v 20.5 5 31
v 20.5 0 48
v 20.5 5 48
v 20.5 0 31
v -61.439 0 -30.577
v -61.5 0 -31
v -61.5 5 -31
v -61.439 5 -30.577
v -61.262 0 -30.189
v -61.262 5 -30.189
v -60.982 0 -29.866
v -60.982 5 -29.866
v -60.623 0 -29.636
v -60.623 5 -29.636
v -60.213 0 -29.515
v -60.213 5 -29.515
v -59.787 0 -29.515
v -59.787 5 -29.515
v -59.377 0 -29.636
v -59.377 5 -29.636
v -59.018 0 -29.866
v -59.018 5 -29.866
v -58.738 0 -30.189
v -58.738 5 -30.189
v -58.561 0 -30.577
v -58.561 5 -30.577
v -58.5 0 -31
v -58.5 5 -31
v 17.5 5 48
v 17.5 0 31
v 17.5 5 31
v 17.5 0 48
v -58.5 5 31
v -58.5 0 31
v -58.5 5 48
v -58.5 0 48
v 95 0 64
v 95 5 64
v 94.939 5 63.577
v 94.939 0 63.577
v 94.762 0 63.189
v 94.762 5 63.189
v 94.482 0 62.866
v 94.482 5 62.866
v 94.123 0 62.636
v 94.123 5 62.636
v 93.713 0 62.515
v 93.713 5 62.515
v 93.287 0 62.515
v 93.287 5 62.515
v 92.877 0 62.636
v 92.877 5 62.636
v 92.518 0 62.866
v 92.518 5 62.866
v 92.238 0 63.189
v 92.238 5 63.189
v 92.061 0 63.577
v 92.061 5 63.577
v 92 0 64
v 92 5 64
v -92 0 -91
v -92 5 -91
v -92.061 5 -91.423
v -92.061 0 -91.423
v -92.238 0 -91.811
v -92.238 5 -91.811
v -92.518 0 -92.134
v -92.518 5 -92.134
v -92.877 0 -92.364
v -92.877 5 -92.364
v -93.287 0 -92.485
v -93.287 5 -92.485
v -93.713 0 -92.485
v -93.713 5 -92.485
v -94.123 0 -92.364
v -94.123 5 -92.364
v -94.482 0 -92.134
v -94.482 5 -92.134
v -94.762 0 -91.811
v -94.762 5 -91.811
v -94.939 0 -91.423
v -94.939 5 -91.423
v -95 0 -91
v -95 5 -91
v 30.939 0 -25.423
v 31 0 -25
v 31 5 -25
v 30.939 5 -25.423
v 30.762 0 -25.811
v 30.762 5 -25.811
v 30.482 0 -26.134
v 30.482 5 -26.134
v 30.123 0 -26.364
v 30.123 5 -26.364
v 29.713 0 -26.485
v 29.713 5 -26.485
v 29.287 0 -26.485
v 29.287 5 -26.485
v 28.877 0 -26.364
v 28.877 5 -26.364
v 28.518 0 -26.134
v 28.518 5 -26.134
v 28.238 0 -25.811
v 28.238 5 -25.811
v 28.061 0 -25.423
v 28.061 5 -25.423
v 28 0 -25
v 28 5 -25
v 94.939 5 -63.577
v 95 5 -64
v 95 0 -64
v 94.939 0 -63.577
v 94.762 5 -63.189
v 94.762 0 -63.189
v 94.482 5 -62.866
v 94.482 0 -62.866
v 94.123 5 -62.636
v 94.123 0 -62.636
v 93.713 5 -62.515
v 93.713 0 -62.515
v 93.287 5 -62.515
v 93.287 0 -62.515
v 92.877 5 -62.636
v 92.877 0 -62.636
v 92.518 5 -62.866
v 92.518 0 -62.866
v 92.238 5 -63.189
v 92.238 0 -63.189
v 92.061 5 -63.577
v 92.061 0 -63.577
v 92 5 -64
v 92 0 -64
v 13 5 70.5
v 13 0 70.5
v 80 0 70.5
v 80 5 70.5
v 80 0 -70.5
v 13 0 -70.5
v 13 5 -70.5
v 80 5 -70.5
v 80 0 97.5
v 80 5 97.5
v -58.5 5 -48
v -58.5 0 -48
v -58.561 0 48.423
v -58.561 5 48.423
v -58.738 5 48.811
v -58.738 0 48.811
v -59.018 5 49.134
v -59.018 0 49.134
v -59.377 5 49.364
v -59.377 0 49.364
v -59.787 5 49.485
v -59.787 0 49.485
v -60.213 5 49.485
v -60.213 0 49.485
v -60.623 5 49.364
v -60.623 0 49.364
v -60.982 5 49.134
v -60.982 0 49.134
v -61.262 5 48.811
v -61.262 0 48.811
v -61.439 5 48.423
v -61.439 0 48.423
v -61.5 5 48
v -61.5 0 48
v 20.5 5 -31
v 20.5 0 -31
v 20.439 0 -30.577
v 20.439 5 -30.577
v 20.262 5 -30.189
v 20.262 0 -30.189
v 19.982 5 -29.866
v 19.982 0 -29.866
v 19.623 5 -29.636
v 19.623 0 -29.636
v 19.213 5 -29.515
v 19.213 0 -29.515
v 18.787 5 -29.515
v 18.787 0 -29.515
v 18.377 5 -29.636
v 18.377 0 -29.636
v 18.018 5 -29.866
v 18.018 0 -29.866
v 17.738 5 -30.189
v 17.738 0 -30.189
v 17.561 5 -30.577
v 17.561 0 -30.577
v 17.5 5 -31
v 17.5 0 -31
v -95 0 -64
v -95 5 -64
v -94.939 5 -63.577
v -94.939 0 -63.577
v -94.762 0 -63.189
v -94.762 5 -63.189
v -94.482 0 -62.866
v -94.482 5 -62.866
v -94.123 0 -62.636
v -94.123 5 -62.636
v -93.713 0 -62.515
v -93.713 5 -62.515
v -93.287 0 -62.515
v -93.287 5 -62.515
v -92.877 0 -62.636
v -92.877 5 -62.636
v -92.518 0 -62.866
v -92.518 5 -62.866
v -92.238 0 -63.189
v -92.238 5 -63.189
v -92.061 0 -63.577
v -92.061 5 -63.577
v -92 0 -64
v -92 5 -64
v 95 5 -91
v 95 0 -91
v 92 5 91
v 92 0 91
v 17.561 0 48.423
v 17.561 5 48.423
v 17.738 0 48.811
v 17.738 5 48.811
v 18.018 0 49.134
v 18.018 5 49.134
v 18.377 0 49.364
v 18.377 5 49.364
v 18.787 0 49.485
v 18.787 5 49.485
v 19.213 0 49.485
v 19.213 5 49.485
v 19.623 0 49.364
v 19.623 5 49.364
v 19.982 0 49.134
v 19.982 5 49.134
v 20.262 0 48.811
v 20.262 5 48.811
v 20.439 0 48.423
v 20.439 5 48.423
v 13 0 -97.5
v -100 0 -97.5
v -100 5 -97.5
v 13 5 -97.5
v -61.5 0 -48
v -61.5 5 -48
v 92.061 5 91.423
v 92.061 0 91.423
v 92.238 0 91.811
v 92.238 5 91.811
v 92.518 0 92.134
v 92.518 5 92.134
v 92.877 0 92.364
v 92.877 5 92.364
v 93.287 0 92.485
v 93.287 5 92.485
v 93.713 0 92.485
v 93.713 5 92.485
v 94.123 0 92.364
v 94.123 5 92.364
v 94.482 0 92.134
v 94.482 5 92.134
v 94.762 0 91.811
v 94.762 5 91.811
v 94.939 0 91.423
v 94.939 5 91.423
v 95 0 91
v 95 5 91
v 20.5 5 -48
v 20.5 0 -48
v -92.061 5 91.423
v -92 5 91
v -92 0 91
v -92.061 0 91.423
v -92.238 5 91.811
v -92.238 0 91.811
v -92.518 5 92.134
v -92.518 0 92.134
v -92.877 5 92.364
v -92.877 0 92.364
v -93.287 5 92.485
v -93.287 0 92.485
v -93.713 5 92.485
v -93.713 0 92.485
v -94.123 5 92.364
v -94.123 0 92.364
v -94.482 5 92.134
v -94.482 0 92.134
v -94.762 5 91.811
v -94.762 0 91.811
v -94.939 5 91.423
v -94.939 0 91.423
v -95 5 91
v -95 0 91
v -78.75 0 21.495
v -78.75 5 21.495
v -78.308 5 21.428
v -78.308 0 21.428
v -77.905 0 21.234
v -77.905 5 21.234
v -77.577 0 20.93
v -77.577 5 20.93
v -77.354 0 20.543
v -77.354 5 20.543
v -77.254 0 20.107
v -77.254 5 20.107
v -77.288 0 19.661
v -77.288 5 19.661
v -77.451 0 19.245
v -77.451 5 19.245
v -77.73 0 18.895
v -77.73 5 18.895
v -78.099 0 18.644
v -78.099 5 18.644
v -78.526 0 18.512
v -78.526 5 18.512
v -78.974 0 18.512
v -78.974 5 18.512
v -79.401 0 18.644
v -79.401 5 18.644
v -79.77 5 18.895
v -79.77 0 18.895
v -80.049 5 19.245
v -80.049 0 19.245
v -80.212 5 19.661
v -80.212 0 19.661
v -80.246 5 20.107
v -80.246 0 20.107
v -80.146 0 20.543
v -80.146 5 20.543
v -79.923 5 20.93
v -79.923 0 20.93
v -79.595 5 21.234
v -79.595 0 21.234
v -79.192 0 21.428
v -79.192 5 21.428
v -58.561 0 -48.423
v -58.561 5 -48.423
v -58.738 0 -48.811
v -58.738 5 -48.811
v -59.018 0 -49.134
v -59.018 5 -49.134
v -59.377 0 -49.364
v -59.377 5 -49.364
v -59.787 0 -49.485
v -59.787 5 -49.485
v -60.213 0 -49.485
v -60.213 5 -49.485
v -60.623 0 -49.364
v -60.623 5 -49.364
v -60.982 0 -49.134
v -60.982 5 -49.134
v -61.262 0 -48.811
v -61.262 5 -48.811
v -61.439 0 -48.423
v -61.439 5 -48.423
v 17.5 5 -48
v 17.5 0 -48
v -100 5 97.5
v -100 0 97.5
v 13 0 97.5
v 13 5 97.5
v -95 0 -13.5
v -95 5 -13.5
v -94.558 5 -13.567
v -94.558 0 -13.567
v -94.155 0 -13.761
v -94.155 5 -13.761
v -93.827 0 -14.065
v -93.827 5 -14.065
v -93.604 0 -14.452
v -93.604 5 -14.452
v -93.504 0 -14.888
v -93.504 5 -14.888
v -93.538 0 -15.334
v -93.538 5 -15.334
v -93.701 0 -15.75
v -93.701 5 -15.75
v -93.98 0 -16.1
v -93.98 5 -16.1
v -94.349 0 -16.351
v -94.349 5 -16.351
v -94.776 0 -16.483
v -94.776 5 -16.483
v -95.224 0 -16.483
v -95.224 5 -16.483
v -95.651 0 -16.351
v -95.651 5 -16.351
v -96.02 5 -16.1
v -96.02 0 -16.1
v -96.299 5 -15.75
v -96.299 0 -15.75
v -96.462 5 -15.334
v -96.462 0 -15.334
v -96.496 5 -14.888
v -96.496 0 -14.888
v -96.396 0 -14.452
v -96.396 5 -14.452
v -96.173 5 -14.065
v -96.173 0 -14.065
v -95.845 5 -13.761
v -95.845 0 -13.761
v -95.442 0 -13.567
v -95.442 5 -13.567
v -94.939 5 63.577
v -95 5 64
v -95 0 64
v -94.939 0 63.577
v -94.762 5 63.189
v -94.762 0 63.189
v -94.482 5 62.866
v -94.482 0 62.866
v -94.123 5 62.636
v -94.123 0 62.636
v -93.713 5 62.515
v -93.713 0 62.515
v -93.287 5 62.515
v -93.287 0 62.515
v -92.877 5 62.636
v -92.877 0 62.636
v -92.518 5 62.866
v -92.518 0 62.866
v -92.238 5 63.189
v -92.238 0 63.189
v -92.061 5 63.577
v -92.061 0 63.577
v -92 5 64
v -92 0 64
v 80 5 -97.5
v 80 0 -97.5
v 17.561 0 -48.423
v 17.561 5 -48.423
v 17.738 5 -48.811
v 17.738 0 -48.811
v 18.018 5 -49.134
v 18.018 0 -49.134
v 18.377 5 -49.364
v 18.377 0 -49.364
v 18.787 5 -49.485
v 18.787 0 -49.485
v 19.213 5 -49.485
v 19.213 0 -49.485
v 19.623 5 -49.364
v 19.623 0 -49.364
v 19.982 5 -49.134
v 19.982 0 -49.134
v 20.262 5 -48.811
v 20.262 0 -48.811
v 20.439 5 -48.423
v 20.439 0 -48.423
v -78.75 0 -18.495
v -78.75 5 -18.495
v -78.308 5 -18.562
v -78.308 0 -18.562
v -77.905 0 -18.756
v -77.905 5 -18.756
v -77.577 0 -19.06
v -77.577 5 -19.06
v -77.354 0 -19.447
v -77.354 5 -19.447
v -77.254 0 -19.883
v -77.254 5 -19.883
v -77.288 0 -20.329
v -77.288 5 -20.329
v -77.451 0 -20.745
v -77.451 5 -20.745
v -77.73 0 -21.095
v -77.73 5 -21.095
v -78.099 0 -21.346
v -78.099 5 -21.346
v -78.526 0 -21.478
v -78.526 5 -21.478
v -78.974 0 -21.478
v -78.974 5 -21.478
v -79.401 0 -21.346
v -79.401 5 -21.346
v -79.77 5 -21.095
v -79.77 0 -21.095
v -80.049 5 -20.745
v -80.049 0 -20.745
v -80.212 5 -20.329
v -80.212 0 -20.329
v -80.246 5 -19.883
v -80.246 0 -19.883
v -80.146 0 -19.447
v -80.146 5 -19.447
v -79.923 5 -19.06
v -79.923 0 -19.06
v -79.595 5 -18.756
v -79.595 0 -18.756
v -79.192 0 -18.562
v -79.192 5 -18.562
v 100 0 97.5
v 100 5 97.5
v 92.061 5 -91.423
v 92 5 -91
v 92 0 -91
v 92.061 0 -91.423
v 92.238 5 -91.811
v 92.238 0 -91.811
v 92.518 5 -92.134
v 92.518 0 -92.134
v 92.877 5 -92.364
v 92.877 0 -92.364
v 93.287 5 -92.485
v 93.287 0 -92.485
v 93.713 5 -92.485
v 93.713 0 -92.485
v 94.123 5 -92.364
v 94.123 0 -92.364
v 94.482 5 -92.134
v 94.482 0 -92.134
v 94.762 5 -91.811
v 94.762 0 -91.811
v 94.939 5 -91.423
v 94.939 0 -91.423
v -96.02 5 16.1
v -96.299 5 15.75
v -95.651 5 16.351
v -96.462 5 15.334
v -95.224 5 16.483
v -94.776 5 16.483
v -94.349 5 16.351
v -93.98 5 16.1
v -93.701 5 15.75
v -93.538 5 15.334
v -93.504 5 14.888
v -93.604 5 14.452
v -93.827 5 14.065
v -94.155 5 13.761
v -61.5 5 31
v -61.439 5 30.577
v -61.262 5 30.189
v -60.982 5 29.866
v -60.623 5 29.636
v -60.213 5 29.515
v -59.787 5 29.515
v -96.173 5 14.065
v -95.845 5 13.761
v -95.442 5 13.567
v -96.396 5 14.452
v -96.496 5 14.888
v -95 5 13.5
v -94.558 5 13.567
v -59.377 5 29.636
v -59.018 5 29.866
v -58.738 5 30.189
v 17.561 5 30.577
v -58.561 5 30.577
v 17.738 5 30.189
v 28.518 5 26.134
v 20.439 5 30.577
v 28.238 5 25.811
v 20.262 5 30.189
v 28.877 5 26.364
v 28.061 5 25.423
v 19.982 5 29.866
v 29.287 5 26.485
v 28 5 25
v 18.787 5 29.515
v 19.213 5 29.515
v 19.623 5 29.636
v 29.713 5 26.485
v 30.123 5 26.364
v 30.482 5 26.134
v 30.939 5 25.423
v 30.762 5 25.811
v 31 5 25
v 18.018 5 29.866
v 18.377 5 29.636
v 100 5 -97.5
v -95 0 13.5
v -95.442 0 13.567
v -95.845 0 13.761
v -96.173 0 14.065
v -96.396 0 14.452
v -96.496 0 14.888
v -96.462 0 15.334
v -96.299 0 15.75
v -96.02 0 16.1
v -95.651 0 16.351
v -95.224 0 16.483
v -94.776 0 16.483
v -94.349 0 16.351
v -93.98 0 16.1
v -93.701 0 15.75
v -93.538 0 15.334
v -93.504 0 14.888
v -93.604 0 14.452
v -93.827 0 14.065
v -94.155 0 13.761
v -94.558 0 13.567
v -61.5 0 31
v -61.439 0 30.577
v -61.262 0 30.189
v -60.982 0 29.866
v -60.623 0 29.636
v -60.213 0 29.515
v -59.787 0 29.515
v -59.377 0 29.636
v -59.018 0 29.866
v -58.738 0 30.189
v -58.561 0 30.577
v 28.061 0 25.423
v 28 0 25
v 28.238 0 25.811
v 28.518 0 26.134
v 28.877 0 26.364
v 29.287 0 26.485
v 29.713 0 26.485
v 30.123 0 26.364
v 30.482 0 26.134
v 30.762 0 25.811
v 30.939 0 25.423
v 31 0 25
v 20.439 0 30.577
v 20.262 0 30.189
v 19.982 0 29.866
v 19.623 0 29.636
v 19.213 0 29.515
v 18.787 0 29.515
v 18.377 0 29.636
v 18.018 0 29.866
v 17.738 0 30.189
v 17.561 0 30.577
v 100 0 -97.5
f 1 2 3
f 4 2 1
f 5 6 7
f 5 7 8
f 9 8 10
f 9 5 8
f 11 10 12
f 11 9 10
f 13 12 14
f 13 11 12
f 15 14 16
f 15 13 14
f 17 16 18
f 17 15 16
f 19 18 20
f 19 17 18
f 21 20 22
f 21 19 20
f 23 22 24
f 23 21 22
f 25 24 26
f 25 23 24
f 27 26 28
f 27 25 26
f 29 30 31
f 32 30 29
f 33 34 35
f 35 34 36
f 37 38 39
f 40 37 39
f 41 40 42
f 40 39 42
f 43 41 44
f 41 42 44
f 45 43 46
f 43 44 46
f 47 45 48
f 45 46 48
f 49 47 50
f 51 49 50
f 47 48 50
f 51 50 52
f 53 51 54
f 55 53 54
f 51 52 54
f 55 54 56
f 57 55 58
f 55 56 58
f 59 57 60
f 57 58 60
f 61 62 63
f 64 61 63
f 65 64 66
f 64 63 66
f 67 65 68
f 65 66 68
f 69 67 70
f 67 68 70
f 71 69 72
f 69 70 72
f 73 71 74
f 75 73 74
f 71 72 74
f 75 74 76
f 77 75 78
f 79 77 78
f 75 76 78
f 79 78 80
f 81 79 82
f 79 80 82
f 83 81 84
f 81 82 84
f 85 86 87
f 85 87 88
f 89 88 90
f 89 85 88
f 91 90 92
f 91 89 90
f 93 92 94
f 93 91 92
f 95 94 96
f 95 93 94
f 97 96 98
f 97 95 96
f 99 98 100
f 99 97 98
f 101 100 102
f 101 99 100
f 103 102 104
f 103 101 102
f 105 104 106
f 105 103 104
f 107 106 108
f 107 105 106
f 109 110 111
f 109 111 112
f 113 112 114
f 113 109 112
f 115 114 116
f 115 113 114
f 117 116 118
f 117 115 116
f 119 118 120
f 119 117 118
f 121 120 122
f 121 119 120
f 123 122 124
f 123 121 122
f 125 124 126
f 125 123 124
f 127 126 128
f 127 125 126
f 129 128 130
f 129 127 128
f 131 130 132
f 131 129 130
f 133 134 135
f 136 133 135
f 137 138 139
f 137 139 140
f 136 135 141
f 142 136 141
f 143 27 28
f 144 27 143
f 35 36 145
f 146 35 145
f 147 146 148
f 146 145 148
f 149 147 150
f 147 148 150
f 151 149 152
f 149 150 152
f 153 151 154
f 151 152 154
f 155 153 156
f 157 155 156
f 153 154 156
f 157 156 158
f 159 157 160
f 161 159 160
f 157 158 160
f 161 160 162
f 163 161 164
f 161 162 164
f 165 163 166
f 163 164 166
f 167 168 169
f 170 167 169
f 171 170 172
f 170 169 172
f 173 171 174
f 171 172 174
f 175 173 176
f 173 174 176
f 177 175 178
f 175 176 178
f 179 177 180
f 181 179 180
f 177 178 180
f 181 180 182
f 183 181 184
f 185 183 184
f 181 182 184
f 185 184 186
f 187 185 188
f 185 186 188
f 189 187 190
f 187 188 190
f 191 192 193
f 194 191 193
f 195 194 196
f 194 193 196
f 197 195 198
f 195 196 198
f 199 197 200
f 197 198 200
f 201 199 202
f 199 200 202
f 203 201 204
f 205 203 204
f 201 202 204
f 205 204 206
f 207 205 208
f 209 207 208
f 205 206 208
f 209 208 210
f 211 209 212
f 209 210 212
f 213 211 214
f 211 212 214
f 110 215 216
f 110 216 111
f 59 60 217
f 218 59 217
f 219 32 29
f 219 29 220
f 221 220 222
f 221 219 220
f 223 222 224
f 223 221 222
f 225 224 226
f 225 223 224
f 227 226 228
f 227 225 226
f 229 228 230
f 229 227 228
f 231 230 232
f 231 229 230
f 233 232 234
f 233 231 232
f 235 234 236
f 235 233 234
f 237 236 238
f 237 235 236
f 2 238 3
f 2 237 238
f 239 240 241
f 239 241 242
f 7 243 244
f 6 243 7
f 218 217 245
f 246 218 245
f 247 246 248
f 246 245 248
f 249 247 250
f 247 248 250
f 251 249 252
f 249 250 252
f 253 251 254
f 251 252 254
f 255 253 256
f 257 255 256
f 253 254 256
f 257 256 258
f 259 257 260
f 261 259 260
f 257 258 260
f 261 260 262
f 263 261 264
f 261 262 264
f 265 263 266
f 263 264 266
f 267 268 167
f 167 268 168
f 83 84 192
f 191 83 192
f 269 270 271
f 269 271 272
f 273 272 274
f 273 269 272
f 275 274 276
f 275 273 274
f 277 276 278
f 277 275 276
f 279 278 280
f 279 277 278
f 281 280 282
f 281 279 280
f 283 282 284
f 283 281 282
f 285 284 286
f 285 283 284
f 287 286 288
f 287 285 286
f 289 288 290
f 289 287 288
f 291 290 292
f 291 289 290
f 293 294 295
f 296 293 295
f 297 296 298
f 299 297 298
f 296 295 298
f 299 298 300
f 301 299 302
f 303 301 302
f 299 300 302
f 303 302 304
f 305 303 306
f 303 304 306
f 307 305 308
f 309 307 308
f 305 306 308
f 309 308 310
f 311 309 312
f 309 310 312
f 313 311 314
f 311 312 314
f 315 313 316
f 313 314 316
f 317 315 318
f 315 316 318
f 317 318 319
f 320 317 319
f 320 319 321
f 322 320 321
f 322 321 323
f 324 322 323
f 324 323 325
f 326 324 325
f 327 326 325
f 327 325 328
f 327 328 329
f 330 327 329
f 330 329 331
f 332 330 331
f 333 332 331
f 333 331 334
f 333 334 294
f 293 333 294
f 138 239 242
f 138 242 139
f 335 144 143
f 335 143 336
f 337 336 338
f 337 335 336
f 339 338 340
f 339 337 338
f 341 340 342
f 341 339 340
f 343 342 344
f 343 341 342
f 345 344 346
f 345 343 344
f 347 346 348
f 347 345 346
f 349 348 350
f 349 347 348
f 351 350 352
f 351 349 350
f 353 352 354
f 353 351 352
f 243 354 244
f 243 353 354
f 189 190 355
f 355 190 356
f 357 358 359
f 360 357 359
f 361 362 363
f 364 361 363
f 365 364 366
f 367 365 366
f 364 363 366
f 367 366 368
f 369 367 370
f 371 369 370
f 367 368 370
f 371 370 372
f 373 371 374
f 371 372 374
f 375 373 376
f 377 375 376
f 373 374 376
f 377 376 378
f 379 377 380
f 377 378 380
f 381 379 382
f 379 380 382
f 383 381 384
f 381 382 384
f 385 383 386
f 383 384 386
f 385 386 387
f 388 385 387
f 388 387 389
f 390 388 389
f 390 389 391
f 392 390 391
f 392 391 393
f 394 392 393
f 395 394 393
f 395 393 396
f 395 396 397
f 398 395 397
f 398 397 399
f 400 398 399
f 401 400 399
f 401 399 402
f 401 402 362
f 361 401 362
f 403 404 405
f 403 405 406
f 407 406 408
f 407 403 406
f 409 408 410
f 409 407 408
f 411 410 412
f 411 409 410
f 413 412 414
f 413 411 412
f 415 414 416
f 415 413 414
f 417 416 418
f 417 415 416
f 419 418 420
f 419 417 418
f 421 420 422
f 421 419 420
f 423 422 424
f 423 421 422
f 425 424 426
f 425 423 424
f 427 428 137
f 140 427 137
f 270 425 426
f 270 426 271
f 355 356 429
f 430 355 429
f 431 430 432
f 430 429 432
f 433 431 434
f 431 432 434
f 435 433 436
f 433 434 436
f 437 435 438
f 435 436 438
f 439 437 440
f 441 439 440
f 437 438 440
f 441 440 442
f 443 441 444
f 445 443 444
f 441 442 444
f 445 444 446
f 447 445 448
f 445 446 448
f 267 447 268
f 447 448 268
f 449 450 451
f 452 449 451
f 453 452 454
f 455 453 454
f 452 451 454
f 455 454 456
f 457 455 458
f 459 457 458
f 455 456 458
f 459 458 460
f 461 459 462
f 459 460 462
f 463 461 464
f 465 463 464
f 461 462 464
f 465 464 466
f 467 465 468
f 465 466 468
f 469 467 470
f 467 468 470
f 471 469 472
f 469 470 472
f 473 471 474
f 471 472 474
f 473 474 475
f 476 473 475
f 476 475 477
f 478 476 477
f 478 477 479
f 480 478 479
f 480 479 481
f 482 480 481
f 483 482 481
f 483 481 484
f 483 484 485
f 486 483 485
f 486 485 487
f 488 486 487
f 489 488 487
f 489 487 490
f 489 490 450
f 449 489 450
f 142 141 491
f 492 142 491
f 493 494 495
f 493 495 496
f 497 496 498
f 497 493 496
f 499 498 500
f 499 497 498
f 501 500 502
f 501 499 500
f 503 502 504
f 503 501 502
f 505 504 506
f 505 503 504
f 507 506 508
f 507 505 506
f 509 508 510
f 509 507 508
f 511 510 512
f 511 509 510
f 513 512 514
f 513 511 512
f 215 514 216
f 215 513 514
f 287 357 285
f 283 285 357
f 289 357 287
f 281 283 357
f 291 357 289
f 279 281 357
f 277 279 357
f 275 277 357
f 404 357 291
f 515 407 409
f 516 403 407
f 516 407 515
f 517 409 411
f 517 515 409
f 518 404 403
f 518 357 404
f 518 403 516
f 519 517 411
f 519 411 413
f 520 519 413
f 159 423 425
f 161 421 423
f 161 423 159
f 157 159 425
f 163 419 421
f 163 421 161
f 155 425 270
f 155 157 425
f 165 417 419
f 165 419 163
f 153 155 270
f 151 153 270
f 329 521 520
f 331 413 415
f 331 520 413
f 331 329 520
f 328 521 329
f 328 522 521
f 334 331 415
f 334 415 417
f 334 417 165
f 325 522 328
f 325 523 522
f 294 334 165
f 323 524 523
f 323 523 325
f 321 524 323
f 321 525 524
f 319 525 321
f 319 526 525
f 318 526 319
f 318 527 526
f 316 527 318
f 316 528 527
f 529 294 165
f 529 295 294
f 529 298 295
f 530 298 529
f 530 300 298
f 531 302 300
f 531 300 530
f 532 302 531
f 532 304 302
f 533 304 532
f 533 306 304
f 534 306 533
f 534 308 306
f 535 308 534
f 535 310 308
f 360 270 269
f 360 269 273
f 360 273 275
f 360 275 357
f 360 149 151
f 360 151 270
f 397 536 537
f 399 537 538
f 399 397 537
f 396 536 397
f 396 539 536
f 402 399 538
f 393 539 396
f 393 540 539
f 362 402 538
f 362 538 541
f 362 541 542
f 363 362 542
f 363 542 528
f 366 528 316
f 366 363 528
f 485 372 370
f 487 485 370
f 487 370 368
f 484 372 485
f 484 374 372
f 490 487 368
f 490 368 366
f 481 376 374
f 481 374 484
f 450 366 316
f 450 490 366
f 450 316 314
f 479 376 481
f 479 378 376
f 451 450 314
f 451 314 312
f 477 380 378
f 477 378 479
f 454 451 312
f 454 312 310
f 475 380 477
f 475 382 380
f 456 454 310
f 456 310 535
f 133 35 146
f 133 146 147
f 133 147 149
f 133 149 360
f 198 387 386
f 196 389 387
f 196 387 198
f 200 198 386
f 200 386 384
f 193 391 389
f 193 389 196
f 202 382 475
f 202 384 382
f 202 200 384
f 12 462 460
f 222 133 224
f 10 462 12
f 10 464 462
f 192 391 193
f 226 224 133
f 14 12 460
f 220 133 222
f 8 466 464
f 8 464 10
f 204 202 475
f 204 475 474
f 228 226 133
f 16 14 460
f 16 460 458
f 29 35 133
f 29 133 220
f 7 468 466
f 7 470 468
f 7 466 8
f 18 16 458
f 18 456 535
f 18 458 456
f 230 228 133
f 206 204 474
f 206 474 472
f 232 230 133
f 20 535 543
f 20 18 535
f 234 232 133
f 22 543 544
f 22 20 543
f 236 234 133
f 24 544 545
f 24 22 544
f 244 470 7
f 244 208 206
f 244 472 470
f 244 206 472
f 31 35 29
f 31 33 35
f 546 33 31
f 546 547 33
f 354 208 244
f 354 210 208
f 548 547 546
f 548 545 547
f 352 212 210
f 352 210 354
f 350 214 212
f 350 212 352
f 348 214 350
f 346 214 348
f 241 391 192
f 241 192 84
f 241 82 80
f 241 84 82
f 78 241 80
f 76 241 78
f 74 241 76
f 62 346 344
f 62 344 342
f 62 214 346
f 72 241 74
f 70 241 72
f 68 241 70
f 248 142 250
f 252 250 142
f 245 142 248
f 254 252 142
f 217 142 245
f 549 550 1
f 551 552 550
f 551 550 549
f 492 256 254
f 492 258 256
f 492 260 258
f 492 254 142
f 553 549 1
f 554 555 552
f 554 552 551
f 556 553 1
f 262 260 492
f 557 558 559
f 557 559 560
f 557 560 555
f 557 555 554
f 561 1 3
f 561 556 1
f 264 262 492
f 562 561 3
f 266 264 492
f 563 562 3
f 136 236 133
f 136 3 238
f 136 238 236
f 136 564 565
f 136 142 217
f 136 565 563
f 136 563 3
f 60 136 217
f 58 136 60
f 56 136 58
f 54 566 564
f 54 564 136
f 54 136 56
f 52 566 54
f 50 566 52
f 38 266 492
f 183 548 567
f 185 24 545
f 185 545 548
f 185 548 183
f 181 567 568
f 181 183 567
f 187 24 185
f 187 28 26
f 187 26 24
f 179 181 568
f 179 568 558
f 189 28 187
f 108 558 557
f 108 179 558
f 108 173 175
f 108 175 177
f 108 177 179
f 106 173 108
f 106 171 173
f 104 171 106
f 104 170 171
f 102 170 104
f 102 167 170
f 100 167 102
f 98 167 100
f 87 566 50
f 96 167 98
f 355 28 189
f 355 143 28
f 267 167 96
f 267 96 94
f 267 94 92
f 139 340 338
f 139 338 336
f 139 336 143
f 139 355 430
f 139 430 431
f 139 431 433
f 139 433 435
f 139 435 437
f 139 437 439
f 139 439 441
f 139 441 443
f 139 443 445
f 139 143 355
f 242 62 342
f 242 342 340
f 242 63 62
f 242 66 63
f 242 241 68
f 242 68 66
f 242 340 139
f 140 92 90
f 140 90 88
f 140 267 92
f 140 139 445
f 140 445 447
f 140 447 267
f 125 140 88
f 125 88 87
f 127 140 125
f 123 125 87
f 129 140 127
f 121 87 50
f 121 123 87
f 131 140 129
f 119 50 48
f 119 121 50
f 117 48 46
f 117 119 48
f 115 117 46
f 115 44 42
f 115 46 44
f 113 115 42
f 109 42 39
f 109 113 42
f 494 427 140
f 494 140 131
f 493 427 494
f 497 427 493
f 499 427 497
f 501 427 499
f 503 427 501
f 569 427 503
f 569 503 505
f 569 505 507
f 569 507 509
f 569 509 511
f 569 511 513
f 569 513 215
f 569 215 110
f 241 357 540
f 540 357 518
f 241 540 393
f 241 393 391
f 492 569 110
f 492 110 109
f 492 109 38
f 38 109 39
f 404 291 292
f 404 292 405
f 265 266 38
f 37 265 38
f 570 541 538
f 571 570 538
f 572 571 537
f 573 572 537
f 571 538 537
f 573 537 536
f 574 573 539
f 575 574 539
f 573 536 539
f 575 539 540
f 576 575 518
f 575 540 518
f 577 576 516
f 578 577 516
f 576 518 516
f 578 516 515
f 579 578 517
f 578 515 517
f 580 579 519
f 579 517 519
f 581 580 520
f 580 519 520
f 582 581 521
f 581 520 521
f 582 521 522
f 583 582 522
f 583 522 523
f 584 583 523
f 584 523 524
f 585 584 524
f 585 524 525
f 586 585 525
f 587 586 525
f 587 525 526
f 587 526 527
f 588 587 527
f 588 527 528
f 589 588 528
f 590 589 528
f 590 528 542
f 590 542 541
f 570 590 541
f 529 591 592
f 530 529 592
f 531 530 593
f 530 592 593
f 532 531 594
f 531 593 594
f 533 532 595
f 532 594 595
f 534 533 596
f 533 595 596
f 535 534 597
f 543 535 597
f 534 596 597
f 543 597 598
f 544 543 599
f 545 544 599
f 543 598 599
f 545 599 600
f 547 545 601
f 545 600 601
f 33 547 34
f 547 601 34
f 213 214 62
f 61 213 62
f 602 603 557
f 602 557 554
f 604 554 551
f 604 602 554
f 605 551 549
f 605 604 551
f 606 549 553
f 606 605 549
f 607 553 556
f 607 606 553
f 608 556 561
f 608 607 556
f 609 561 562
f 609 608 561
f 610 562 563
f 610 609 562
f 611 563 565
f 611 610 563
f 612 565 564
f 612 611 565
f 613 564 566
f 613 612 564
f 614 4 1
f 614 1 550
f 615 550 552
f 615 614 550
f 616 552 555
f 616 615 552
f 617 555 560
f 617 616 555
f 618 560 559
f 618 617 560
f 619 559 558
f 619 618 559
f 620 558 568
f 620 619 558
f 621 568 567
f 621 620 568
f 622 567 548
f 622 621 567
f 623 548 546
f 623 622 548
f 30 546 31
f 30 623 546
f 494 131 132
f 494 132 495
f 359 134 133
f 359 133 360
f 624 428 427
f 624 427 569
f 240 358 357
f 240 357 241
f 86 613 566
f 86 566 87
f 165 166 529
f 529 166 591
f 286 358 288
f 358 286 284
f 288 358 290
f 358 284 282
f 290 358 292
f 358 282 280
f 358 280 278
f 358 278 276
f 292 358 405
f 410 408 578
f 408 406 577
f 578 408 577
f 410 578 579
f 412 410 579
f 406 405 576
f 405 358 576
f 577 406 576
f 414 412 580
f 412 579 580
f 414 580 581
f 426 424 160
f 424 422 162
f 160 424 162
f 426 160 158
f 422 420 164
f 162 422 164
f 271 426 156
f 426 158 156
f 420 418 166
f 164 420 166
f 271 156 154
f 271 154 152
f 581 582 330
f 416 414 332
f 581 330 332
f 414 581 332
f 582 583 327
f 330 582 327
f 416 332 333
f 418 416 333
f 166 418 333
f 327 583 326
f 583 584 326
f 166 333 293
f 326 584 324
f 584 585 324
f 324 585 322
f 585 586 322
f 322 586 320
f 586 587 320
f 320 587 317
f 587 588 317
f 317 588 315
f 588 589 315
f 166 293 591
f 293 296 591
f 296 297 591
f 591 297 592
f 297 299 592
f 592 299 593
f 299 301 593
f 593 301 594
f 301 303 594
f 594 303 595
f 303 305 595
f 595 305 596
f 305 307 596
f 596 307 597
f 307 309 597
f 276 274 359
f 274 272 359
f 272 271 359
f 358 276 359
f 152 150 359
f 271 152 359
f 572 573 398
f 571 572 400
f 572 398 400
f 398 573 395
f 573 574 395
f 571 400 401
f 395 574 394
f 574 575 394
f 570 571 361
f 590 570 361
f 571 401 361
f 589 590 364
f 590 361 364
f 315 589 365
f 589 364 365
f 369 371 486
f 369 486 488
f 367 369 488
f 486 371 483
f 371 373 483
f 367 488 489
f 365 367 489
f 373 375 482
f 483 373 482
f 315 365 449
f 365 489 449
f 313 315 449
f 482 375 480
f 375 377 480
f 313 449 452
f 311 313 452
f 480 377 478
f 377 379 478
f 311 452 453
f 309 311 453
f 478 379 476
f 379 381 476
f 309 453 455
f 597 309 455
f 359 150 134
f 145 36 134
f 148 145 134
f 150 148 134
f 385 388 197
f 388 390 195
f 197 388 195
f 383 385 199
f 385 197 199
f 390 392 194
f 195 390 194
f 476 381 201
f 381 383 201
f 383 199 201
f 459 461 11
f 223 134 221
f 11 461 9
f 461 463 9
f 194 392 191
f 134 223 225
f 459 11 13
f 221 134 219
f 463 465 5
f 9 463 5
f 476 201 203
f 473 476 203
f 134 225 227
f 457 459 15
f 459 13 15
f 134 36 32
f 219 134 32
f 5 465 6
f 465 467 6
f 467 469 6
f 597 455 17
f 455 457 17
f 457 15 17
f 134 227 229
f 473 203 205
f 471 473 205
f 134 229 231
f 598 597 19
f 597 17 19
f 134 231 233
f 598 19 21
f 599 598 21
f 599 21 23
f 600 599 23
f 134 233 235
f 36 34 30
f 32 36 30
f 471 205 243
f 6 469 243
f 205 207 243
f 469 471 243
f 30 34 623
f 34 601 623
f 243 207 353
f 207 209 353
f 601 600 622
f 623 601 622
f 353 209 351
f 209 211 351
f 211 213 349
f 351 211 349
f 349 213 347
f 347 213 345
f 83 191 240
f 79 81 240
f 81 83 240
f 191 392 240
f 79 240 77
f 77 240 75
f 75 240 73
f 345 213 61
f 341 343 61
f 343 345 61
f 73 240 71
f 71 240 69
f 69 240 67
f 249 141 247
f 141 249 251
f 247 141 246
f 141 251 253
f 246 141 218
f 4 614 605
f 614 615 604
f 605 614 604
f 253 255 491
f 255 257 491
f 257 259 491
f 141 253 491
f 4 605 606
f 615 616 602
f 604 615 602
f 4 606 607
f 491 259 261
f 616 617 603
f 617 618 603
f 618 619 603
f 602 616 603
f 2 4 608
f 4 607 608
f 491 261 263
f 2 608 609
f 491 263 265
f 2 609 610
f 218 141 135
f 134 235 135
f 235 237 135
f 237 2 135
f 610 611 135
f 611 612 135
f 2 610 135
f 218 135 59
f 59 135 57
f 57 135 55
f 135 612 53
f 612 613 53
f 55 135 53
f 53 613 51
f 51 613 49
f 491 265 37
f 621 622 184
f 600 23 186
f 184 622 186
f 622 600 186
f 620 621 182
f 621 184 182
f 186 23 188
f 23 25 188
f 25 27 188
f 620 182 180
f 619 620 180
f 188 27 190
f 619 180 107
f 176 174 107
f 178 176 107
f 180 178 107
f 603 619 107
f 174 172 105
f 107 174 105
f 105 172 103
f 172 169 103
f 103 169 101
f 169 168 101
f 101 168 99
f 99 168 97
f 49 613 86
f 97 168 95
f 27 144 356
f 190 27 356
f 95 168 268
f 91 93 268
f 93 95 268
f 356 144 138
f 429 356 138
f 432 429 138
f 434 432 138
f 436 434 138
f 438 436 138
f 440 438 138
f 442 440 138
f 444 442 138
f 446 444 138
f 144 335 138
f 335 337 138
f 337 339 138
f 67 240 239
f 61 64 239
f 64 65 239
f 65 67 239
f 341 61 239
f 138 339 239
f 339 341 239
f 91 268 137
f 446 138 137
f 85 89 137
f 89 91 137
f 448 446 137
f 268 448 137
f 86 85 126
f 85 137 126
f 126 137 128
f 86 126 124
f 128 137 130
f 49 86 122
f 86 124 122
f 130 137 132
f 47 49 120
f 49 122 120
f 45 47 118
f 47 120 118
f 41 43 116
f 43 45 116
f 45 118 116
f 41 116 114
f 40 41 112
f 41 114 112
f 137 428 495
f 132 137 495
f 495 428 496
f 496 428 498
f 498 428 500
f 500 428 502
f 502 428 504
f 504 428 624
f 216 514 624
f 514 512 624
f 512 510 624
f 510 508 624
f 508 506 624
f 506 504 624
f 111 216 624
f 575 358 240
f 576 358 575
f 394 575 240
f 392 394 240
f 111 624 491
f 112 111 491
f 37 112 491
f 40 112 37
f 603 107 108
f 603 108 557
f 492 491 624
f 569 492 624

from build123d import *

# Parameters (mm, degrees)
SKETCH2_W           = 200
SKETCH2_H           = 195
BOSS_EXTRUDE1_DEPTH = 5
CUT_EXTRUDE1_DEPTH  = 140.754248594
SKETCH4_W           = 67
SKETCH4_H           = 27
CUT_EXTRUDE2_DEPTH  = 140.754248594
CUT_EXTRUDE4_DEPTH  = 140.754248594
CUT_EXTRUDE5_DEPTH  = 140.754248594
SKETCH8_R           = 1.5
CUT_EXTRUDE6_DEPTH  = 140.754248594
SKETCH9_R           = 1.5
CUT_EXTRUDE7_DEPTH  = 140.754248594


with BuildPart() as part:
    # Sketch2 → Boss-Extrude1 (new body)
    with BuildSketch(Plane(origin=(0, 0, 0), x_dir=(1, 0, 0), z_dir=(0, 1, 0))):
        Rectangle(SKETCH2_W, SKETCH2_H)
    extrude(amount=BOSS_EXTRUDE1_DEPTH)

    # Sketch3 → Cut-Extrude1 (cut, through all)
    with BuildSketch(Plane(origin=(0, 5, 0), x_dir=(1, 0, 0), z_dir=(0, 1, 0))):
        with BuildLine():
            Line((-95, -91), (-95, -64))
            ThreePointArc((-95, -64), (-93.5, -62.5), (-92, -64))
            Line((-92, -64), (-92, -91))
            ThreePointArc((-92, -91), (-93.5, -92.5), (-95, -91))
        make_face()
        with BuildLine():
            Line((-95, 91), (-95, 64))
            ThreePointArc((-95, 64), (-93.5, 62.5), (-92, 64))
            Line((-92, 64), (-92, 91))
            ThreePointArc((-92, 91), (-93.5, 92.5), (-95, 91))
        make_face()
        with BuildLine():
            Line((95, 91), (95, 64))
            ThreePointArc((95, 64), (93.5, 62.5), (92, 64))
            Line((92, 64), (92, 91))
            ThreePointArc((92, 91), (93.5, 92.5), (95, 91))
        make_face()
        with BuildLine():
            Line((95, -91), (95, -64))
            ThreePointArc((95, -64), (93.5, -62.5), (92, -64))
            Line((92, -64), (92, -91))
            ThreePointArc((92, -91), (93.5, -92.5), (95, -91))
        make_face()
    extrude(amount=-CUT_EXTRUDE1_DEPTH, mode=Mode.SUBTRACT)

    # Sketch4 → Cut-Extrude2 (cut, through all)
    with BuildSketch(Plane.XZ):
        with Locations((46.5, -84)):
            Rectangle(SKETCH4_W, SKETCH4_H)
        with Locations((46.5, 84)):
            Rectangle(SKETCH4_W, SKETCH4_H)
    extrude(amount=-CUT_EXTRUDE2_DEPTH, mode=Mode.SUBTRACT)

    # Sketch5 → Cut-Extrude4 (cut, through all)
    with BuildSketch(Plane.XZ):
        with BuildLine():
            Line((-61.5, -48), (-61.5, -31))
            ThreePointArc((-61.5, -31), (-60, -29.5), (-58.5, -31))
            Line((-58.5, -31), (-58.5, -48))
            ThreePointArc((-58.5, -48), (-60, -49.5), (-61.5, -48))
        make_face()
        with BuildLine():
            Line((-61.5, 48), (-61.5, 31))
            ThreePointArc((-61.5, 31), (-60, 29.5), (-58.5, 31))
            Line((-58.5, 31), (-58.5, 48))
            ThreePointArc((-58.5, 48), (-60, 49.5), (-61.5, 48))
        make_face()
        with BuildLine():
            Line((20.5, 48), (20.5, 31))
            ThreePointArc((20.5, 31), (19, 29.5), (17.5, 31))
            Line((17.5, 31), (17.5, 48))
            ThreePointArc((17.5, 48), (19, 49.5), (20.5, 48))
        make_face()
        with BuildLine():
            Line((20.5, -48), (20.5, -31))
            ThreePointArc((20.5, -31), (19, -29.5), (17.5, -31))
            Line((17.5, -31), (17.5, -48))
            ThreePointArc((17.5, -48), (19, -49.5), (20.5, -48))
        make_face()
    extrude(amount=-CUT_EXTRUDE4_DEPTH, mode=Mode.SUBTRACT)

    # Sketch7 → Cut-Extrude5 (cut, through all)
    with BuildSketch(Plane.XZ):
        with BuildLine():
            Line((28, -25), (28, 25))
            ThreePointArc((28, 25), (29.5, 26.5), (31, 25))
            Line((31, 25), (31, -25))
            ThreePointArc((31, -25), (29.5, -26.5), (28, -25))
        make_face()
    extrude(amount=-CUT_EXTRUDE5_DEPTH, mode=Mode.SUBTRACT)

    # Sketch8 → Cut-Extrude6 (cut, through all)
    with BuildSketch(Plane(origin=(0, 5, 0), x_dir=(1, 0, 0), z_dir=(0, 1, 0))):
        with Locations(Location((-78.75, 19.995, 0), (0, 0, 270))):
            Circle(SKETCH8_R)
        with Locations(Location((-78.75, -19.995, 0), (0, 0, 270))):
            Circle(SKETCH8_R)
    extrude(amount=-CUT_EXTRUDE6_DEPTH, mode=Mode.SUBTRACT)

    # Sketch9 → Cut-Extrude7 (cut, through all)
    with BuildSketch(Plane(origin=(0, 5, 0), x_dir=(1, 0, 0), z_dir=(0, 1, 0))):
        with Locations(Location((-95, 15, 0), (0, 0, 270))):
            Circle(SKETCH9_R)
        with Locations(Location((-95, -15, 0), (0, 0, 90))):
            Circle(SKETCH9_R)
    extrude(amount=-CUT_EXTRUDE7_DEPTH, mode=Mode.SUBTRACT)


solid = part.part
